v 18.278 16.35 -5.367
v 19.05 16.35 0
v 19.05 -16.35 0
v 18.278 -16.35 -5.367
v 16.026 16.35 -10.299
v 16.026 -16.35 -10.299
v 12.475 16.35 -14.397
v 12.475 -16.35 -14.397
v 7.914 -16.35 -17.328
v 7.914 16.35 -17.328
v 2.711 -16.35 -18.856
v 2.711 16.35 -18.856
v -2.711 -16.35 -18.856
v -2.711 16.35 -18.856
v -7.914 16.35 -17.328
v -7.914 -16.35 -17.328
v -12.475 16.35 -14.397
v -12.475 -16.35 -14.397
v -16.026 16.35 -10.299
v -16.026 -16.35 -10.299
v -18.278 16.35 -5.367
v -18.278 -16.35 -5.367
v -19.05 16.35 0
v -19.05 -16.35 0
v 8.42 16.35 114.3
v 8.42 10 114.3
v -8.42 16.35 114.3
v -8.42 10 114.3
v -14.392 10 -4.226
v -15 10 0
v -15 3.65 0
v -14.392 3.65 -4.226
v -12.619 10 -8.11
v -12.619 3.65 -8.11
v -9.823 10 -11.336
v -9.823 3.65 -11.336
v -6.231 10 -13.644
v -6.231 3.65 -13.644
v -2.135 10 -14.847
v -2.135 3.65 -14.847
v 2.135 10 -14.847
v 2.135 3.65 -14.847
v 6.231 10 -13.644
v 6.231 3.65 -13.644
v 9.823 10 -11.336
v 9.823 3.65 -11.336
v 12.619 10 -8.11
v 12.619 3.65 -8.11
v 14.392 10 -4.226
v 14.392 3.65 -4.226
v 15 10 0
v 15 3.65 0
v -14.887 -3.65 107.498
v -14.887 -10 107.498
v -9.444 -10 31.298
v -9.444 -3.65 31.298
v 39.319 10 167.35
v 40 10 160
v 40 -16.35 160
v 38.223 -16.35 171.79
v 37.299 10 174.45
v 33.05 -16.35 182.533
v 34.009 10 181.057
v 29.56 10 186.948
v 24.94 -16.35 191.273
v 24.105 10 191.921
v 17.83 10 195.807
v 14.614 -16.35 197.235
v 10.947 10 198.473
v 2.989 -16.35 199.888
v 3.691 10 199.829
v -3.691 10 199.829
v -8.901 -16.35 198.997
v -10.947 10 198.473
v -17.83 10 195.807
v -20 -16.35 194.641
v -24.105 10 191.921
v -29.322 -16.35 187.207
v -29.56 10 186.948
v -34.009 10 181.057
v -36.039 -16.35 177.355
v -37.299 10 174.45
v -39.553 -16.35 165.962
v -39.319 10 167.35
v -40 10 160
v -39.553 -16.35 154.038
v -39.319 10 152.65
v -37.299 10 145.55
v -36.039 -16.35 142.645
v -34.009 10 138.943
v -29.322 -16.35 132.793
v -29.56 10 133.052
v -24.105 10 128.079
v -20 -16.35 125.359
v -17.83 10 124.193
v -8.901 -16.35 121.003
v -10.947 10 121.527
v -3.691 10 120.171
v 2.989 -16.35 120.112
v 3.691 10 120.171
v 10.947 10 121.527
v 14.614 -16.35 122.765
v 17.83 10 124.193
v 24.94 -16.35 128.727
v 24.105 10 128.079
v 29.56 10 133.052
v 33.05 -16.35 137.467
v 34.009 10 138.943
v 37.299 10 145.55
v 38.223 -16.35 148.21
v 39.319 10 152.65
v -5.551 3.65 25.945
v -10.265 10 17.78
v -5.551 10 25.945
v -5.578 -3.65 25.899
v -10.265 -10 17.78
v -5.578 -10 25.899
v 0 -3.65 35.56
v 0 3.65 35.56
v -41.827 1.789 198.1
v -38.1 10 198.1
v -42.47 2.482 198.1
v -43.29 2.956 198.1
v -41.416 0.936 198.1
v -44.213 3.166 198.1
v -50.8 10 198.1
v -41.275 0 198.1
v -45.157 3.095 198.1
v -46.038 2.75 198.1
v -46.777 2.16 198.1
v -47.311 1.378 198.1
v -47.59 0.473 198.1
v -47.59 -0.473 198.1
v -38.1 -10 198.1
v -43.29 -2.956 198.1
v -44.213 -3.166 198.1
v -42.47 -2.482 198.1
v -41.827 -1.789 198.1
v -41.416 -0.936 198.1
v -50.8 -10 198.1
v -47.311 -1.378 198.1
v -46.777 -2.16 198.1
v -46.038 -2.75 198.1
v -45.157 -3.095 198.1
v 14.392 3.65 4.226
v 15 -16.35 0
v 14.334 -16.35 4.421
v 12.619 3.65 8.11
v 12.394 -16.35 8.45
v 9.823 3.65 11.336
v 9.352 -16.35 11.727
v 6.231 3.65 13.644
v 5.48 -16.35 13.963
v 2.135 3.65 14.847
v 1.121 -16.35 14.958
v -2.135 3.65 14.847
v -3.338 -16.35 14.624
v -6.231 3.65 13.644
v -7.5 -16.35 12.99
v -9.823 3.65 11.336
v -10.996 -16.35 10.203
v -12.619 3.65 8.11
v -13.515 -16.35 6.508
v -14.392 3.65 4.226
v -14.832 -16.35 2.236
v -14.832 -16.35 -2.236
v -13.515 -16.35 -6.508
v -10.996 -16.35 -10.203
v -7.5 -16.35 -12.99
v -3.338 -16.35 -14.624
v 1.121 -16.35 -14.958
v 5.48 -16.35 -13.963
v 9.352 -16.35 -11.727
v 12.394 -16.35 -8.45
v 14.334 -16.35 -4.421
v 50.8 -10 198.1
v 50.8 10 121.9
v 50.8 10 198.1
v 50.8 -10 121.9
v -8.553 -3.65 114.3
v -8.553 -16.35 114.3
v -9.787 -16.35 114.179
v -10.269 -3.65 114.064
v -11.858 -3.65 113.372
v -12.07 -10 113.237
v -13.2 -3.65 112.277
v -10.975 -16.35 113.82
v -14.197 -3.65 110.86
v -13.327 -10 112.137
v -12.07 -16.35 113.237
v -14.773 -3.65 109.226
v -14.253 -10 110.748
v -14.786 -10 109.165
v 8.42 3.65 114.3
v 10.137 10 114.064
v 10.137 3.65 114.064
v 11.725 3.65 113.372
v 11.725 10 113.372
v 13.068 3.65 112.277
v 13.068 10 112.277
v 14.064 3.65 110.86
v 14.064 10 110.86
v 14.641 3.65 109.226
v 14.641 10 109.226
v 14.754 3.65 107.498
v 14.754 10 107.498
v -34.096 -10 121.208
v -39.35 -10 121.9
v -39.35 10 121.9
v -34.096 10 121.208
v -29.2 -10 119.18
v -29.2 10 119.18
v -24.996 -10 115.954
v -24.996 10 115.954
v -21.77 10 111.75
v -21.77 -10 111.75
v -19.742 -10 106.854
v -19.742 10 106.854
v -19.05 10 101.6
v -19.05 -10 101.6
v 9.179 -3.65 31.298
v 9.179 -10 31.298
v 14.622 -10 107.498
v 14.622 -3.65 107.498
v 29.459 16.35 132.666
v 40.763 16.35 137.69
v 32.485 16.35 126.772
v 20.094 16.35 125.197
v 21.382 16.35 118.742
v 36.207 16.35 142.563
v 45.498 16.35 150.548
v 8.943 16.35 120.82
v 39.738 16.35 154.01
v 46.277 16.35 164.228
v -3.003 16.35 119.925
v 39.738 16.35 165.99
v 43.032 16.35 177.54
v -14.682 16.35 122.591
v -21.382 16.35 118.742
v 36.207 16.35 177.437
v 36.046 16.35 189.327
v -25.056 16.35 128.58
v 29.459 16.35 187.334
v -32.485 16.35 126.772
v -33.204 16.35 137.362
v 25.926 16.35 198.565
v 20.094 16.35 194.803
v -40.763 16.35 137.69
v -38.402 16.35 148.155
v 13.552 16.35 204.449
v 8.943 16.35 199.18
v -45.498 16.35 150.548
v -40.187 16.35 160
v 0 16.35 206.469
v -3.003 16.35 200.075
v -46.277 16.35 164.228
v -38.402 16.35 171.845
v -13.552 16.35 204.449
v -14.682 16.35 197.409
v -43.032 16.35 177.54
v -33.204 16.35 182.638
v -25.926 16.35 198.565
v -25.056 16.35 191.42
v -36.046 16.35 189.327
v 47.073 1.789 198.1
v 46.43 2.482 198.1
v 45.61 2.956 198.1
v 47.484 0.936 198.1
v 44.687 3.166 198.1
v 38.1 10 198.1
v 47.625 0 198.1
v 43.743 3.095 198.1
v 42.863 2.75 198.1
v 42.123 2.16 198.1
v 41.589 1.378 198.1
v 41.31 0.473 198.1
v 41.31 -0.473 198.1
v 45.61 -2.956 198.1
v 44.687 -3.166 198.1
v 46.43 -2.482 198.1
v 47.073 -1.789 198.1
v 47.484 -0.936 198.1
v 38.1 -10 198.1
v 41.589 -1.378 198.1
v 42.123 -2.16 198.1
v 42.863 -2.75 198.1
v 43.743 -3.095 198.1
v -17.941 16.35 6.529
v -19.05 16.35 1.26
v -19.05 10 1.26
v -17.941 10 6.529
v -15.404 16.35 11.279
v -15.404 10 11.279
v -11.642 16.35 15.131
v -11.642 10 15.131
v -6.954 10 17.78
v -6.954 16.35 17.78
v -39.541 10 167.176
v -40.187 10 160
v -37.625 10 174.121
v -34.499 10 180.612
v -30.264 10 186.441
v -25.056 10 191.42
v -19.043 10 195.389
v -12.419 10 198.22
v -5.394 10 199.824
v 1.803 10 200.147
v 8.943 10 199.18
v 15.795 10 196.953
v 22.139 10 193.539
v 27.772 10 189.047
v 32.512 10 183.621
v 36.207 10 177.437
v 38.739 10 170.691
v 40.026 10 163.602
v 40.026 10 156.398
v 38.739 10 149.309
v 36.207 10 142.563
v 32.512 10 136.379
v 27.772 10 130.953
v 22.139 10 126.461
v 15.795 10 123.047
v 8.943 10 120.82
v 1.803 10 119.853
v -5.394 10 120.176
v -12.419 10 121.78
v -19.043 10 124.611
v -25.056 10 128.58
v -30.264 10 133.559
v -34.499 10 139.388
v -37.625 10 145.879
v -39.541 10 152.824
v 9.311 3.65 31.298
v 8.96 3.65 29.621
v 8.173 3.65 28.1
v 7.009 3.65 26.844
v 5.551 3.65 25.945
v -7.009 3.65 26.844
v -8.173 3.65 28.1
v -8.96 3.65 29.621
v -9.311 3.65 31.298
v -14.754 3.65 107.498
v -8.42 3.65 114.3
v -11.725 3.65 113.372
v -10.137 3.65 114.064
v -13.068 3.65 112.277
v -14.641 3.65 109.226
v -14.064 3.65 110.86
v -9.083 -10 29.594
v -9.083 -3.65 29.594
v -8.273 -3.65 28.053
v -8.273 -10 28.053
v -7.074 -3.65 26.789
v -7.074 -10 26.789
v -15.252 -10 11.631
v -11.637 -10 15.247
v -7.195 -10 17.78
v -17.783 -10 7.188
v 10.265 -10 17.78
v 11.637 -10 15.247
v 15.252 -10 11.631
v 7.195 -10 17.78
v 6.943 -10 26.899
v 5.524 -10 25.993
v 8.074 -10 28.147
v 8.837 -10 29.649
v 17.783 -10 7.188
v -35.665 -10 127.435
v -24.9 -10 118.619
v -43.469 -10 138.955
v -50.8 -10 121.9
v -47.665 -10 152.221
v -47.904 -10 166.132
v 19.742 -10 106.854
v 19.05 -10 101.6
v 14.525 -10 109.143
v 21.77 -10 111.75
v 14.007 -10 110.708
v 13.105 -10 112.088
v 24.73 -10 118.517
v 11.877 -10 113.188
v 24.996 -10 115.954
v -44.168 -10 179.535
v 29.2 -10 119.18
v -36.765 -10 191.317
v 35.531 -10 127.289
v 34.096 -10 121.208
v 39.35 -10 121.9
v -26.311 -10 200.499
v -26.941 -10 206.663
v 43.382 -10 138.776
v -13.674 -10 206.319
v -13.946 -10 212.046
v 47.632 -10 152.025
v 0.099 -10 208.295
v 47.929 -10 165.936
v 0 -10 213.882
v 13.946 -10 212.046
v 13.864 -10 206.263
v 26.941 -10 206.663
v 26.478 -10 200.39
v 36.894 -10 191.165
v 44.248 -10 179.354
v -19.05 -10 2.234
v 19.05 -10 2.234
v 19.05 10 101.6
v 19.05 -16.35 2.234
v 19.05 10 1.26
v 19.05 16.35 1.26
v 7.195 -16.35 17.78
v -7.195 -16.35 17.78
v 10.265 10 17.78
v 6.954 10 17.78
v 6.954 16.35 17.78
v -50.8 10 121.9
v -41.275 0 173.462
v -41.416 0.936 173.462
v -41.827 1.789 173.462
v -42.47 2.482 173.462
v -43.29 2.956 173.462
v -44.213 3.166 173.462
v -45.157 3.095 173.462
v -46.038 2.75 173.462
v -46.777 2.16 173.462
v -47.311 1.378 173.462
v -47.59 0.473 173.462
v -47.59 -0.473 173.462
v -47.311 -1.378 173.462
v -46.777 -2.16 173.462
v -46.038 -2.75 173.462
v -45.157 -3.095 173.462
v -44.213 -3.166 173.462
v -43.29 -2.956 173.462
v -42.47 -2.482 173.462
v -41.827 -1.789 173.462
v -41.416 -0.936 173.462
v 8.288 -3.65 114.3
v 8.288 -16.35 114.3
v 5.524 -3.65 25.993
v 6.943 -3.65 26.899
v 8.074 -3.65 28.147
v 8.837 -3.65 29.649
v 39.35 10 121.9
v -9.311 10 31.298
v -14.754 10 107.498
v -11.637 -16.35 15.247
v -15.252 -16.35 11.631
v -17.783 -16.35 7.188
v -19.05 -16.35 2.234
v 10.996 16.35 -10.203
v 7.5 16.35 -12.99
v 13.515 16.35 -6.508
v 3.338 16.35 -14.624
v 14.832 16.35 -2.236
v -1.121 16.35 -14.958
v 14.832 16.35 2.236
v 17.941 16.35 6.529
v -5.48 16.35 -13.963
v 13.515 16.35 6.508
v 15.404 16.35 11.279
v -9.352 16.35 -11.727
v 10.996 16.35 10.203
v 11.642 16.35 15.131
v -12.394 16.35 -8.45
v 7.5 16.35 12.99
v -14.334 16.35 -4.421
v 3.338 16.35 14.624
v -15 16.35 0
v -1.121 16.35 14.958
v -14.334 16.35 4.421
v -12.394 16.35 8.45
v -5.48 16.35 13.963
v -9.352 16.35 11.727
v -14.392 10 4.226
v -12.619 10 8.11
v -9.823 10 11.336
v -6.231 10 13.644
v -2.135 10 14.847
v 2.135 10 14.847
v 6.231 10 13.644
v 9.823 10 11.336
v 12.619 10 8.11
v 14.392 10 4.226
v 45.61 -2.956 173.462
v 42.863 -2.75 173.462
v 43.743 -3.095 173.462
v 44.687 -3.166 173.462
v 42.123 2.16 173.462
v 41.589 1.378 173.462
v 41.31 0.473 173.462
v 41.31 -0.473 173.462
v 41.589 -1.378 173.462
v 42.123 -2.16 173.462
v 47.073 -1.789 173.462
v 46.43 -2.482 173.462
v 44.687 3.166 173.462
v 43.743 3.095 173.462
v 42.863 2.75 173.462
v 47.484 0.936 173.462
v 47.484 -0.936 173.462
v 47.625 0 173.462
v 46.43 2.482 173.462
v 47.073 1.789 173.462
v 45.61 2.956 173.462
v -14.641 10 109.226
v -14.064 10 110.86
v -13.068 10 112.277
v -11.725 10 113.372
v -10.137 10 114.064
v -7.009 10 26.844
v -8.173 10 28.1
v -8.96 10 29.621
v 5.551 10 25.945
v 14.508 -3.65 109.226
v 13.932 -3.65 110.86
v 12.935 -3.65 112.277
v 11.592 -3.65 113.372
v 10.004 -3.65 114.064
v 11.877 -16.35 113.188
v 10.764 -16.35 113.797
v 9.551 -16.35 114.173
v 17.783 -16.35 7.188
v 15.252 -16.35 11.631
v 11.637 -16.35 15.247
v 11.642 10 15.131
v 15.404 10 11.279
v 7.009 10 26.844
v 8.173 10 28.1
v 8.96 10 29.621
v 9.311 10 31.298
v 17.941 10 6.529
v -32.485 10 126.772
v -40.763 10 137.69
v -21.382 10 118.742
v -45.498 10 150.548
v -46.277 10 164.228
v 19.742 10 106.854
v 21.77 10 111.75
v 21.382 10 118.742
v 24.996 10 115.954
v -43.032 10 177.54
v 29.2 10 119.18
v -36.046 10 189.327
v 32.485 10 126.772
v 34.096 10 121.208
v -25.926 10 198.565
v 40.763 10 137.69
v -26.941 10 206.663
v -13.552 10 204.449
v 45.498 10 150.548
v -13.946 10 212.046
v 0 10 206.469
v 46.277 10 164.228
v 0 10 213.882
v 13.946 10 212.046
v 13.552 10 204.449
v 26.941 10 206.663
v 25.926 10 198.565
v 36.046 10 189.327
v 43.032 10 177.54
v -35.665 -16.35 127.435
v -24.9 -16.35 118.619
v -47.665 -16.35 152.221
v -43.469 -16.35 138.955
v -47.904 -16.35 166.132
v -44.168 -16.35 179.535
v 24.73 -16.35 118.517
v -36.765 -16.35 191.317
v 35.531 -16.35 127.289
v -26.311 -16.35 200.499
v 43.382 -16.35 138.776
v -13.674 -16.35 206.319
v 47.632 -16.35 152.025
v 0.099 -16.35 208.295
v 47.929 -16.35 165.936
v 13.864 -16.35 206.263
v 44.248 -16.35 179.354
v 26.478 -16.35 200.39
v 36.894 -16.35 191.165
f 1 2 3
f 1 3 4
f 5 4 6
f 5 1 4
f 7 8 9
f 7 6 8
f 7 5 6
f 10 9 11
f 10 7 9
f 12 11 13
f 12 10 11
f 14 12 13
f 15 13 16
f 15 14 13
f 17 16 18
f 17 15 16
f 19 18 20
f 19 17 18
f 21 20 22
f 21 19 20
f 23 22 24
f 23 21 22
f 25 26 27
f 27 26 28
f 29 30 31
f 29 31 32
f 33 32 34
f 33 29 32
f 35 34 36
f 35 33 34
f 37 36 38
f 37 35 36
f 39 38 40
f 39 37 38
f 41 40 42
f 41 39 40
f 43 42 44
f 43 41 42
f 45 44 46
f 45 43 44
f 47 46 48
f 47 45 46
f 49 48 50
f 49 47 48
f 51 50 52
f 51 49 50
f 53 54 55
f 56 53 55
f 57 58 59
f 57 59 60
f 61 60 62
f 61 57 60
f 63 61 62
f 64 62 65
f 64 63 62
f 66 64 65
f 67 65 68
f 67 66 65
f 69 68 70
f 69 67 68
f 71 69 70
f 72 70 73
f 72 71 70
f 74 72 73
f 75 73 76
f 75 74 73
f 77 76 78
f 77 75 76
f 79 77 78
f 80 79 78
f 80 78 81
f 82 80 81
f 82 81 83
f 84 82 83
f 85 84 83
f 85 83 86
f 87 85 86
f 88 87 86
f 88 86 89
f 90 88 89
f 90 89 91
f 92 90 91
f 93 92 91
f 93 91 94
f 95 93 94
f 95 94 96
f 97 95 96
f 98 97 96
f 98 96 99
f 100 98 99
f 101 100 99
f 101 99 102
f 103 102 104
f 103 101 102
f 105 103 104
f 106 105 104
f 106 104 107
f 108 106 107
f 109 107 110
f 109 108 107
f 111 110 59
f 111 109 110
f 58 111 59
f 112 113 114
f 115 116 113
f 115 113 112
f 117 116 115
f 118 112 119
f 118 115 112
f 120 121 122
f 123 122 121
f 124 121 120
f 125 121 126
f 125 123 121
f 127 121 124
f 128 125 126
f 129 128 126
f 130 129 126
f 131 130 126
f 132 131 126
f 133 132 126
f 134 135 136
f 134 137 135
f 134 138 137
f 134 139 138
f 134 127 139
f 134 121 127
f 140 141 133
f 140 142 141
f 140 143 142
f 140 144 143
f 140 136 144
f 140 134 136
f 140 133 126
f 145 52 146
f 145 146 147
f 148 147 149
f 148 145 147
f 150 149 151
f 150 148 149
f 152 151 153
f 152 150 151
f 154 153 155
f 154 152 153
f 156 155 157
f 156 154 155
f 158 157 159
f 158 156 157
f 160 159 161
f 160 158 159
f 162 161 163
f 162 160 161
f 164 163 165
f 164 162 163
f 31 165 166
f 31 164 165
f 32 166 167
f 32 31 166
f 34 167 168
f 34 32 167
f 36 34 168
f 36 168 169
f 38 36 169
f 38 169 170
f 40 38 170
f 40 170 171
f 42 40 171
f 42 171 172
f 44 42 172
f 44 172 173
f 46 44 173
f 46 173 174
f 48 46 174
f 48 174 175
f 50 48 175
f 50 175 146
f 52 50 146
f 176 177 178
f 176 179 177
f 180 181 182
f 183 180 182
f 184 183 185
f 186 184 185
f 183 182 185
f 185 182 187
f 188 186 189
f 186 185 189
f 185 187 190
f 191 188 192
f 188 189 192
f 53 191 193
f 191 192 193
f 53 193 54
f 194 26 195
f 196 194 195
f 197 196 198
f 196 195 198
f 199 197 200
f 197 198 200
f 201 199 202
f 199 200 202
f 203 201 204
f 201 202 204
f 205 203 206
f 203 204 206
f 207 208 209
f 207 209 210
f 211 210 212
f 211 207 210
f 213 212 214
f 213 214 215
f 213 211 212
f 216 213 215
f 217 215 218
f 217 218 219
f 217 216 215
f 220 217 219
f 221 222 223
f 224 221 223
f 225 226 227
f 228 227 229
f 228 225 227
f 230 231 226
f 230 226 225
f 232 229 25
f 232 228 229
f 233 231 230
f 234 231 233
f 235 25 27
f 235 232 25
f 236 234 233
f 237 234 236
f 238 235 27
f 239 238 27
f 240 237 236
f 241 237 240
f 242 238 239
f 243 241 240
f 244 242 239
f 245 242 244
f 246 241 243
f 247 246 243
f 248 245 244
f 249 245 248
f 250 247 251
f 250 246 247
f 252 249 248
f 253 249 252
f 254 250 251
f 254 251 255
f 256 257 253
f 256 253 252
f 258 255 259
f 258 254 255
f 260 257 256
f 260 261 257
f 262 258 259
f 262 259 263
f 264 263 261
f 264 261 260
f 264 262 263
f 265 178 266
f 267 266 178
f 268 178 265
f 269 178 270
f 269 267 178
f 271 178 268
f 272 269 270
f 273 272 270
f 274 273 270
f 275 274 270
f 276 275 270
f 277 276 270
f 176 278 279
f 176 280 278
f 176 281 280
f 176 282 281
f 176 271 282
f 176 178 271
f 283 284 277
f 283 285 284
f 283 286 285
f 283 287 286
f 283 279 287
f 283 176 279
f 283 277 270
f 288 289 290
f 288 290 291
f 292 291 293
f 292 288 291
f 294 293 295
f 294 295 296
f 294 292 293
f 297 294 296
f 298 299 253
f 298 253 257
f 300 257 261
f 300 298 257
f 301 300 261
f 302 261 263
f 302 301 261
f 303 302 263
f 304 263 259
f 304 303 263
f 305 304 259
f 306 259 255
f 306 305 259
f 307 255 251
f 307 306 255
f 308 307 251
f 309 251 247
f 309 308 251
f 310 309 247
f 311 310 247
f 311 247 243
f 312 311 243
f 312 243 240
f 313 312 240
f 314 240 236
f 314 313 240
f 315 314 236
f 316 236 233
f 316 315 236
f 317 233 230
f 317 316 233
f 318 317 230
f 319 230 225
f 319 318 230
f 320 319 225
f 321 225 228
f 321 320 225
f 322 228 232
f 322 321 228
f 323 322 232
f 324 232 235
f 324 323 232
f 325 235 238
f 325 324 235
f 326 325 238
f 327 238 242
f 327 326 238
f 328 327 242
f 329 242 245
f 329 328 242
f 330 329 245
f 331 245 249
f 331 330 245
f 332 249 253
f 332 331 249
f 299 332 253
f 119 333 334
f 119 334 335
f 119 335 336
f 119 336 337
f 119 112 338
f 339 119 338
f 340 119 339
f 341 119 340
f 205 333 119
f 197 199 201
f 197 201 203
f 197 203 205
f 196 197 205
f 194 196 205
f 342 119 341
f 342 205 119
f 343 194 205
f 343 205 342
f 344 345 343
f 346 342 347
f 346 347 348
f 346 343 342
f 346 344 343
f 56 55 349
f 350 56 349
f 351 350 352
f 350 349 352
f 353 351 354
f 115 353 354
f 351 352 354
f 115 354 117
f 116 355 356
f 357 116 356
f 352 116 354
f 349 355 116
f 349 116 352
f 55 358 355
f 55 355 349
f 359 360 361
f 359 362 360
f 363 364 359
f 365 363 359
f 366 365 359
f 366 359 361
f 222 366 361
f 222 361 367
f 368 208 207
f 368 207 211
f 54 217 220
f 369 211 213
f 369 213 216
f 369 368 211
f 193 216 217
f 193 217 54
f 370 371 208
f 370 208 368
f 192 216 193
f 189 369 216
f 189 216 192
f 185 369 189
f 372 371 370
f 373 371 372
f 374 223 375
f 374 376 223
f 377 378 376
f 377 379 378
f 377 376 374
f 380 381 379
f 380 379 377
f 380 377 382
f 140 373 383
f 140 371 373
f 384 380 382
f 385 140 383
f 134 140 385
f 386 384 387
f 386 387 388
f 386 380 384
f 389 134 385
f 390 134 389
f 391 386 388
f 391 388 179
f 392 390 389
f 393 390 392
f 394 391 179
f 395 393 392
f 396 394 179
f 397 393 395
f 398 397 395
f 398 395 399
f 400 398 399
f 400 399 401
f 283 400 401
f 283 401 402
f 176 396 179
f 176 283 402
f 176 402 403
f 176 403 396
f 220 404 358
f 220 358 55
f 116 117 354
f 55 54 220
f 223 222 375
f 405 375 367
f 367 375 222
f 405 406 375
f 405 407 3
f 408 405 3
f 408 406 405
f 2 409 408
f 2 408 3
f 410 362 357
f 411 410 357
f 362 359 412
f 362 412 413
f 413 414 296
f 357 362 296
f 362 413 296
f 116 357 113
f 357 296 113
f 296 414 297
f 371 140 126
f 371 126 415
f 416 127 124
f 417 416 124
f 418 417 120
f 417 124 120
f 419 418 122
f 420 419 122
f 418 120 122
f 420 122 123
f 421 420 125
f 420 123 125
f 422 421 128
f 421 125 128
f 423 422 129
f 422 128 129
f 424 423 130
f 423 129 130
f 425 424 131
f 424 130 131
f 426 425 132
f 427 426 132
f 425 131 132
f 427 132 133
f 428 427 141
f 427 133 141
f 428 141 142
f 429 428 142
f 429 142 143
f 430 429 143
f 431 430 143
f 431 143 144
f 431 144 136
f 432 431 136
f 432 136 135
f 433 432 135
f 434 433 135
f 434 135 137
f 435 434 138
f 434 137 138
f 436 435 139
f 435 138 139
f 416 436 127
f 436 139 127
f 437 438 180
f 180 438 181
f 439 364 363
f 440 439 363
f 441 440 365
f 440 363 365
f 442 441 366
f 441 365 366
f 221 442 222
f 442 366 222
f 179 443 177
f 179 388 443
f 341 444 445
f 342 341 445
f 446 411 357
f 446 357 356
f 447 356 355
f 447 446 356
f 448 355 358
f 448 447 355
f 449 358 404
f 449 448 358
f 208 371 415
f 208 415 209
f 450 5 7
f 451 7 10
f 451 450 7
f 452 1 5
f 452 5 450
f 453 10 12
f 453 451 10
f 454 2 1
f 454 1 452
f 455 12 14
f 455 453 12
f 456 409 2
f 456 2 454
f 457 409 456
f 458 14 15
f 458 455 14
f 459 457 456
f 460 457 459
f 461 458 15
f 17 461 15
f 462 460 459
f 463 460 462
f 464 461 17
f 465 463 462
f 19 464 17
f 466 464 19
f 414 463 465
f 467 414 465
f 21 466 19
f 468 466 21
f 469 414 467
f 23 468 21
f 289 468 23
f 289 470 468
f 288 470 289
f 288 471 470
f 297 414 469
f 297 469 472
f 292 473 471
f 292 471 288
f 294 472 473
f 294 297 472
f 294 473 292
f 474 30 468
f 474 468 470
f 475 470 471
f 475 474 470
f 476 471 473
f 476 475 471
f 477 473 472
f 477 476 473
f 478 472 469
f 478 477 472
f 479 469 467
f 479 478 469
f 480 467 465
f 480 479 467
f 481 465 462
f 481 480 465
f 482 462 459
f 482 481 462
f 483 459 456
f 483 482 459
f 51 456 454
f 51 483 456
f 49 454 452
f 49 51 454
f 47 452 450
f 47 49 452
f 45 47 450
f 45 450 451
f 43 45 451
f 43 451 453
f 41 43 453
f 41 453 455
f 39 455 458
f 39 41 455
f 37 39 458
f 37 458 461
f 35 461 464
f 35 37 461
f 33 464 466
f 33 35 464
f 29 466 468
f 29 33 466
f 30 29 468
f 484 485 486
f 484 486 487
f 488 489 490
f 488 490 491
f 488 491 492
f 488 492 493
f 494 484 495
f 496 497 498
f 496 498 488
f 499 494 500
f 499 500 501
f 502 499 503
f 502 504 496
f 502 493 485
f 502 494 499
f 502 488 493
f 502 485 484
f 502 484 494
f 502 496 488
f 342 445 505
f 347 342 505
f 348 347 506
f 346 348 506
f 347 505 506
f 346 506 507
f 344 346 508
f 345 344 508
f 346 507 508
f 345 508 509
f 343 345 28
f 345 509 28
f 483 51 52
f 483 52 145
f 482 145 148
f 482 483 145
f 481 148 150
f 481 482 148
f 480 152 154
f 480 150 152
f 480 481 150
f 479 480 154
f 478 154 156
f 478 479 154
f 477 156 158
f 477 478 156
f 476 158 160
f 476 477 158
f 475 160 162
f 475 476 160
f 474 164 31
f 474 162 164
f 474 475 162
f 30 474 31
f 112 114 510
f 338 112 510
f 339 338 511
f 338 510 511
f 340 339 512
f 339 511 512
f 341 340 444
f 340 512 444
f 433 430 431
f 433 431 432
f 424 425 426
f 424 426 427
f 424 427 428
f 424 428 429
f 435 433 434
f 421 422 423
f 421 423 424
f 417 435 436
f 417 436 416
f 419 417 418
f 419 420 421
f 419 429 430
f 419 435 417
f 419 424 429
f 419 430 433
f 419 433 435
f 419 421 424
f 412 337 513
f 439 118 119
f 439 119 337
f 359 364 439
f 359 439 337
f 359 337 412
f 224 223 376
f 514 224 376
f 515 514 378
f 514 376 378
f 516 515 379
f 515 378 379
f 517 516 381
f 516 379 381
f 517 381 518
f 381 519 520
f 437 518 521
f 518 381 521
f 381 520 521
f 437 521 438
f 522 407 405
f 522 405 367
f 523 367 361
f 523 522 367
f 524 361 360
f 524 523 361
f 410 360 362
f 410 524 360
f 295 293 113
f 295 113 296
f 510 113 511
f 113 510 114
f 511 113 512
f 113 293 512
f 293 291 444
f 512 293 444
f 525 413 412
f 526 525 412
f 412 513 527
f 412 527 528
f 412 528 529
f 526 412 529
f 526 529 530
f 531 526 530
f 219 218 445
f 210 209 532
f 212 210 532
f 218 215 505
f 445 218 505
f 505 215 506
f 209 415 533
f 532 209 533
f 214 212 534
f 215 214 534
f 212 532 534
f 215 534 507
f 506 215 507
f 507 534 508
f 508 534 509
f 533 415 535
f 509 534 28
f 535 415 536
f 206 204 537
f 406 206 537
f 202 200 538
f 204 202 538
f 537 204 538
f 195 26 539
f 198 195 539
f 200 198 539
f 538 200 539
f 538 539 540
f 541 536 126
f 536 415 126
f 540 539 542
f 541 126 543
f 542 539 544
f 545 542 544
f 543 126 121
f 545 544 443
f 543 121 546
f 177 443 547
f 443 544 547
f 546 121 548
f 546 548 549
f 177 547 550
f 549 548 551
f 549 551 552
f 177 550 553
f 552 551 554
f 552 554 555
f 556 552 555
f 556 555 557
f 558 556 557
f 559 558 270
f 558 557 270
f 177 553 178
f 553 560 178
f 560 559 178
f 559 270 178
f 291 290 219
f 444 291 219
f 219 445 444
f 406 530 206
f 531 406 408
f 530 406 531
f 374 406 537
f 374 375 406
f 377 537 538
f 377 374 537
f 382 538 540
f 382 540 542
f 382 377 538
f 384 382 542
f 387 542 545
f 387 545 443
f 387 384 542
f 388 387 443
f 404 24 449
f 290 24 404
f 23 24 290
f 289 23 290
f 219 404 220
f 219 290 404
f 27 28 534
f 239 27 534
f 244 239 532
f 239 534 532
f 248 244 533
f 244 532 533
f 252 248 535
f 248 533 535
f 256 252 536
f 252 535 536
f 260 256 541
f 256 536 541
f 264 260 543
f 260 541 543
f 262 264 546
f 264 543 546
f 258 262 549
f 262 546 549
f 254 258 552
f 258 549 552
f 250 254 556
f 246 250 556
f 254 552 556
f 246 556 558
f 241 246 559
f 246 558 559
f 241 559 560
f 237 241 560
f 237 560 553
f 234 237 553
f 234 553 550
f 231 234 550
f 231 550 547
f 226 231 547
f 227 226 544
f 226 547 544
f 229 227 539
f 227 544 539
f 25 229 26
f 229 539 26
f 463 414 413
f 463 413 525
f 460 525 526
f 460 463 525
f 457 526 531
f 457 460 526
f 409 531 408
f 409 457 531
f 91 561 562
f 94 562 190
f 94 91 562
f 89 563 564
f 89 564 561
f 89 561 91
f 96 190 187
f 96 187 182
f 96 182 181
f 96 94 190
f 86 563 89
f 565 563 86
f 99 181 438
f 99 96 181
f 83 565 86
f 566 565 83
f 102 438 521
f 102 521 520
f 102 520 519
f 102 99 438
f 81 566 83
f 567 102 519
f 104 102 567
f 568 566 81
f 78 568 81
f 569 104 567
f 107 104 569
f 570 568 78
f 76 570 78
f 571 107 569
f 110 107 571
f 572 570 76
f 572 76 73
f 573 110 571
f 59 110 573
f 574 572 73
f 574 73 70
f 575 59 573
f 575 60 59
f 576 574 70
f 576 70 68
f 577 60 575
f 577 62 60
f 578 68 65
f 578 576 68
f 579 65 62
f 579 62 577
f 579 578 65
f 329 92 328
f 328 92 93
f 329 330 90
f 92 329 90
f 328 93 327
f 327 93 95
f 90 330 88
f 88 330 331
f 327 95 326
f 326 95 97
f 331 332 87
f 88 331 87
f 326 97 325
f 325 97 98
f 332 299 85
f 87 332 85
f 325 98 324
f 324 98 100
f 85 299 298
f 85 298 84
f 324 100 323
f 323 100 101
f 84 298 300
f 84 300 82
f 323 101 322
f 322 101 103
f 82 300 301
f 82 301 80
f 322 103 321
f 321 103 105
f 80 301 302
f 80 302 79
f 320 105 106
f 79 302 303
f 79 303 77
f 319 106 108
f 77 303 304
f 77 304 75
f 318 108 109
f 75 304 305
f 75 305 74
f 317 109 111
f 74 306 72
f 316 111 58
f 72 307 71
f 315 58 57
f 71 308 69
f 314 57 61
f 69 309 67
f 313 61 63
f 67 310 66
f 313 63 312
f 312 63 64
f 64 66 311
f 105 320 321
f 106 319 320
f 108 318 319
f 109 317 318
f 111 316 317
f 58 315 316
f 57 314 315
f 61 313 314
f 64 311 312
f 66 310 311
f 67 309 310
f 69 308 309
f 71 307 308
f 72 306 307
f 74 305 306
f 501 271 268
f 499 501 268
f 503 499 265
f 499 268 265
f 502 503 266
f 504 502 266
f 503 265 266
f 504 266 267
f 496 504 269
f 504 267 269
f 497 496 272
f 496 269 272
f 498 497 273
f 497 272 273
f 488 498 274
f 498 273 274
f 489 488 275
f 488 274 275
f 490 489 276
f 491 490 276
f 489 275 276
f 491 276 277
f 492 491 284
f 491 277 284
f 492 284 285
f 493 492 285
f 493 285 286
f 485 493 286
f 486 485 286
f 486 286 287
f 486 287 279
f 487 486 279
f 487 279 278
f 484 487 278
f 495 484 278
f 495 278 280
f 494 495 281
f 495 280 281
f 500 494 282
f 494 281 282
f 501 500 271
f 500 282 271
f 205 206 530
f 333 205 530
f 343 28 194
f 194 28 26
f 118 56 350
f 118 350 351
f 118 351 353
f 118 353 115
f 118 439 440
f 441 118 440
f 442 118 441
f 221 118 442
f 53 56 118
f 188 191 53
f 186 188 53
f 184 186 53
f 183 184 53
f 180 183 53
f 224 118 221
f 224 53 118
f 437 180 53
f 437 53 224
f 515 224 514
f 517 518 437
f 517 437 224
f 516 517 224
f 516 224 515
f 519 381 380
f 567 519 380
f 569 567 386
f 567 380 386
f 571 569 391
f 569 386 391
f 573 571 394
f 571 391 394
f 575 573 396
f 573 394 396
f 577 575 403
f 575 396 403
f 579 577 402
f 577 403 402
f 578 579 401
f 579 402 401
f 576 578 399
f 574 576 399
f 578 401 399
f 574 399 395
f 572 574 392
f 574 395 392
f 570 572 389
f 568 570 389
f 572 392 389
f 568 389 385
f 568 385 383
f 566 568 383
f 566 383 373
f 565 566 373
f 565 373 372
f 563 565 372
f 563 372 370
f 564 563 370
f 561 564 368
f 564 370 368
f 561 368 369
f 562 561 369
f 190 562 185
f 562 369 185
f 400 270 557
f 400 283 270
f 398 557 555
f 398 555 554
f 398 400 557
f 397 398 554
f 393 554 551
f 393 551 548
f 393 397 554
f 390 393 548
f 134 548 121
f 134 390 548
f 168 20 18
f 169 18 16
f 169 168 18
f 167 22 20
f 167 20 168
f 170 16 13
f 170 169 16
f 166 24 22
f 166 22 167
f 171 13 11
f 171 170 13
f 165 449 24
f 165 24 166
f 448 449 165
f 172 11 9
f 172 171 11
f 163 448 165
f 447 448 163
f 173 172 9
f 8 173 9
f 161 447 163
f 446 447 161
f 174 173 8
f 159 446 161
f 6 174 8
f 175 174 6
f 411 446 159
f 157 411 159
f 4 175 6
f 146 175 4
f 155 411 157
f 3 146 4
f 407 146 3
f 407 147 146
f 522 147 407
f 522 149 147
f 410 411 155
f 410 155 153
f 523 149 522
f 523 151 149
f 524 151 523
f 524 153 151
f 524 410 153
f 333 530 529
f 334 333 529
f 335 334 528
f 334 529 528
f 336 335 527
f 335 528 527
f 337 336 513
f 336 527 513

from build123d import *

# Parameters (mm, degrees)
F0_R      = 15
F0_R_2    = 40
F1_DEPTH  = 10
F3_DEPTH  = 6.35
F5_DEPTH  = 6.35
F6_R      = 40
F6_R_2    = 15
F7_DEPTH  = 6.35
F8_R      = 40.1872824047
F8_R_2    = 15
F9_DEPTH  = 6.35
F10_R     = 3.175
F11_DEPTH = 24.638


with BuildPart() as f1:
    # F0 (on Front) → F1 (new body, symmetric)
    with BuildSketch(Plane.XZ):
        with BuildLine():
            Line((-38.1, 198.1), (-50.8, 198.1))
            Line((-50.8, 198.1), (-50.8, 121.9))
            Line((-50.8, 121.9), (-39.35, 121.9))
            ThreePointArc((-39.35, 121.9), (-24.9957323419, 115.9542676581), (-19.05, 101.6))
            Line((-19.05, 101.6), (-19.05, 0))
            ThreePointArc((-19.05, 0), (0, -19.05), (19.05, 0))
            Line((19.05, 0), (19.05, 101.6))
            ThreePointArc((19.05, 101.6), (24.9957323419, 115.9542676581), (39.35, 121.9))
            Line((39.35, 121.9), (50.8, 121.9))
            Line((50.8, 121.9), (50.8, 198.1))
            Line((50.8, 198.1), (38.1, 198.1))
            ThreePointArc((38.1, 198.1), (0, 213.8815367264), (-38.1, 198.1))
        make_face()
        Circle(F0_R, mode=Mode.SUBTRACT)
        Polygon((10.2652877862, 17.78), (-10.2652877862, 17.78), (0, 35.56), align=None, mode=Mode.SUBTRACT)
        with Locations((0, 160)):
            Circle(F0_R_2, mode=Mode.SUBTRACT)
    extrude(amount=F1_DEPTH, both=True)

    # F2 (on face) → F3 (cut)
    with BuildSketch(Plane(origin=(0, 10, 0), x_dir=(-1, 0, 0), z_dir=(0, 1, 0))):
        with BuildLine():
            Line((8.4202502013, 114.3), (-8.4202502013, 114.3))
            ThreePointArc((-8.4202502013, 114.3), (-13.0675805733, 112.2772185539), (-14.7541129452, 107.4975812326))
            Line((-14.7541129452, 107.4975812326), (-9.3112558023, 31.2975812326))
            ThreePointArc((-9.3112558023, 31.2975812326), (-8.1734716854, 28.0998949464), (-5.5512178996, 25.9450085541))
            Line((-5.5512178996, 25.9450085541), (0, 35.56))
            Line((0, 35.56), (5.5512178996, 25.9450085541))
            ThreePointArc((5.5512178996, 25.9450085541), (8.1734716854, 28.0998949464), (9.3112558023, 31.2975812326))
            Line((9.3112558023, 31.2975812326), (14.7541129452, 107.4975812326))
            ThreePointArc((14.7541129452, 107.4975812326), (13.0675805733, 112.2772185539), (8.4202502013, 114.3))
        make_face()
    extrude(amount=-F3_DEPTH, mode=Mode.SUBTRACT)

    # F4 (on face) → F5 (cut)
    with BuildSketch(Plane.XZ.offset(10)):
        with BuildLine():
            Line((8.2876571429, 114.3), (-8.5528432597, 114.3))
            ThreePointArc((-8.5528432597, 114.3), (-13.2001736317, 112.2772185539), (-14.8867060036, 107.4975812326))
            Line((-14.8867060036, 107.4975812326), (-9.4438488607, 31.2975812326))
            ThreePointArc((-9.4438488607, 31.2975812326), (-8.2726256774, 28.0527506485), (-5.5777130107, 25.8991176753))
            Line((-5.5777130107, 25.8991176753), (0, 35.56))
            Line((0, 35.56), (5.5236666839, 25.9927286594))
            ThreePointArc((5.5236666839, 25.9927286594), (8.0738236317, 28.1472494037), (9.1786627439, 31.2975812326))
            Line((9.1786627439, 31.2975812326), (14.6215198868, 107.4975812326))
            ThreePointArc((14.6215198868, 107.4975812326), (12.9349875149, 112.2772185539), (8.2876571429, 114.3))
        make_face()
    extrude(amount=-F5_DEPTH, mode=Mode.SUBTRACT)

    # F6 (on face) → F7 (join, symmetric)
    with BuildSketch(Plane.XZ.offset(10)):
        with BuildLine():
            ThreePointArc((8.2876571429, 114.3), (10.166594253, 114.0156487976), (11.8772548194, 113.1880615232))
            ThreePointArc((11.8772548194, 113.1880615232), (38.1185074142, 130.3452169369), (48.295204379, 160))
            ThreePointArc((48.295204379, 160), (-29.5763862031, 198.1793680562), (-12.0695529054, 113.2372727627))
            ThreePointArc((-12.0695529054, 113.2372727627), (-10.3897316554, 114.0285147052), (-8.5528432597, 114.3))
            Line((-8.5528432597, 114.3), (8.2876571429, 114.3))
        make_face()
        with Locations((0, 160)):
            Circle(F6_R, mode=Mode.SUBTRACT)
        with BuildLine():
            Line((19.05, 0), (19.05, 2.2343365964))
            ThreePointArc((19.05, 2.2343365964), (15.2517343468, 11.630965542), (7.1948842955, 17.78))
            Line((7.1948842955, 17.78), (-7.1948842955, 17.78))
            ThreePointArc((-7.1948842955, 17.78), (-15.2517343468, 11.630965542), (-19.05, 2.2343365964))
            Line((-19.05, 2.2343365964), (-19.05, 0))
            ThreePointArc((-19.05, 0), (0, -19.05), (19.05, 0))
        make_face()
        Circle(F6_R_2, mode=Mode.SUBTRACT)
    extrude(amount=F7_DEPTH, both=True)

    # F8 (on face) → F9 (join, symmetric)
    with BuildSketch(Plane(origin=(0, 10, 0), x_dir=(-1, 0, 0), z_dir=(0, 1, 0))):
        with BuildLine():
            Line((-8.4202502013, 114.3), (8.4202502013, 114.3))
            ThreePointArc((8.4202502013, 114.3), (35.7118556811, 130.2669547933), (46.4692437366, 160))
            ThreePointArc((46.4692437366, 160), (-29.7330452067, 195.7118556811), (-8.4202502013, 114.3))
        make_face()
        with Locations((0, 160)):
            Circle(F8_R, mode=Mode.SUBTRACT)
        with BuildLine():
            Line((19.05, 0), (19.05, 1.2599718654))
            ThreePointArc((19.05, 1.2599718654), (15.4039969033, 11.2786040139), (6.9542525911, 17.78))
            Line((6.9542525911, 17.78), (-6.9542525911, 17.78))
            ThreePointArc((-6.9542525911, 17.78), (-15.4039969033, 11.2786040139), (-19.05, 1.2599718654))
            Line((-19.05, 1.2599718654), (-19.05, 0))
            ThreePointArc((-19.05, 0), (0, -19.05), (19.05, 0))
        make_face()
        Circle(F8_R_2, mode=Mode.SUBTRACT)
    extrude(amount=F9_DEPTH, both=True)

    # F10 (on face) → F11 (cut)
    with BuildSketch(Plane.XY.offset(198.1)):
        with Locations((-44.45, 0)):
            Circle(F10_R)
        with Locations((44.45, 0)):
            Circle(F10_R)
    extrude(amount=-F11_DEPTH, mode=Mode.SUBTRACT)


solid = f1.part
